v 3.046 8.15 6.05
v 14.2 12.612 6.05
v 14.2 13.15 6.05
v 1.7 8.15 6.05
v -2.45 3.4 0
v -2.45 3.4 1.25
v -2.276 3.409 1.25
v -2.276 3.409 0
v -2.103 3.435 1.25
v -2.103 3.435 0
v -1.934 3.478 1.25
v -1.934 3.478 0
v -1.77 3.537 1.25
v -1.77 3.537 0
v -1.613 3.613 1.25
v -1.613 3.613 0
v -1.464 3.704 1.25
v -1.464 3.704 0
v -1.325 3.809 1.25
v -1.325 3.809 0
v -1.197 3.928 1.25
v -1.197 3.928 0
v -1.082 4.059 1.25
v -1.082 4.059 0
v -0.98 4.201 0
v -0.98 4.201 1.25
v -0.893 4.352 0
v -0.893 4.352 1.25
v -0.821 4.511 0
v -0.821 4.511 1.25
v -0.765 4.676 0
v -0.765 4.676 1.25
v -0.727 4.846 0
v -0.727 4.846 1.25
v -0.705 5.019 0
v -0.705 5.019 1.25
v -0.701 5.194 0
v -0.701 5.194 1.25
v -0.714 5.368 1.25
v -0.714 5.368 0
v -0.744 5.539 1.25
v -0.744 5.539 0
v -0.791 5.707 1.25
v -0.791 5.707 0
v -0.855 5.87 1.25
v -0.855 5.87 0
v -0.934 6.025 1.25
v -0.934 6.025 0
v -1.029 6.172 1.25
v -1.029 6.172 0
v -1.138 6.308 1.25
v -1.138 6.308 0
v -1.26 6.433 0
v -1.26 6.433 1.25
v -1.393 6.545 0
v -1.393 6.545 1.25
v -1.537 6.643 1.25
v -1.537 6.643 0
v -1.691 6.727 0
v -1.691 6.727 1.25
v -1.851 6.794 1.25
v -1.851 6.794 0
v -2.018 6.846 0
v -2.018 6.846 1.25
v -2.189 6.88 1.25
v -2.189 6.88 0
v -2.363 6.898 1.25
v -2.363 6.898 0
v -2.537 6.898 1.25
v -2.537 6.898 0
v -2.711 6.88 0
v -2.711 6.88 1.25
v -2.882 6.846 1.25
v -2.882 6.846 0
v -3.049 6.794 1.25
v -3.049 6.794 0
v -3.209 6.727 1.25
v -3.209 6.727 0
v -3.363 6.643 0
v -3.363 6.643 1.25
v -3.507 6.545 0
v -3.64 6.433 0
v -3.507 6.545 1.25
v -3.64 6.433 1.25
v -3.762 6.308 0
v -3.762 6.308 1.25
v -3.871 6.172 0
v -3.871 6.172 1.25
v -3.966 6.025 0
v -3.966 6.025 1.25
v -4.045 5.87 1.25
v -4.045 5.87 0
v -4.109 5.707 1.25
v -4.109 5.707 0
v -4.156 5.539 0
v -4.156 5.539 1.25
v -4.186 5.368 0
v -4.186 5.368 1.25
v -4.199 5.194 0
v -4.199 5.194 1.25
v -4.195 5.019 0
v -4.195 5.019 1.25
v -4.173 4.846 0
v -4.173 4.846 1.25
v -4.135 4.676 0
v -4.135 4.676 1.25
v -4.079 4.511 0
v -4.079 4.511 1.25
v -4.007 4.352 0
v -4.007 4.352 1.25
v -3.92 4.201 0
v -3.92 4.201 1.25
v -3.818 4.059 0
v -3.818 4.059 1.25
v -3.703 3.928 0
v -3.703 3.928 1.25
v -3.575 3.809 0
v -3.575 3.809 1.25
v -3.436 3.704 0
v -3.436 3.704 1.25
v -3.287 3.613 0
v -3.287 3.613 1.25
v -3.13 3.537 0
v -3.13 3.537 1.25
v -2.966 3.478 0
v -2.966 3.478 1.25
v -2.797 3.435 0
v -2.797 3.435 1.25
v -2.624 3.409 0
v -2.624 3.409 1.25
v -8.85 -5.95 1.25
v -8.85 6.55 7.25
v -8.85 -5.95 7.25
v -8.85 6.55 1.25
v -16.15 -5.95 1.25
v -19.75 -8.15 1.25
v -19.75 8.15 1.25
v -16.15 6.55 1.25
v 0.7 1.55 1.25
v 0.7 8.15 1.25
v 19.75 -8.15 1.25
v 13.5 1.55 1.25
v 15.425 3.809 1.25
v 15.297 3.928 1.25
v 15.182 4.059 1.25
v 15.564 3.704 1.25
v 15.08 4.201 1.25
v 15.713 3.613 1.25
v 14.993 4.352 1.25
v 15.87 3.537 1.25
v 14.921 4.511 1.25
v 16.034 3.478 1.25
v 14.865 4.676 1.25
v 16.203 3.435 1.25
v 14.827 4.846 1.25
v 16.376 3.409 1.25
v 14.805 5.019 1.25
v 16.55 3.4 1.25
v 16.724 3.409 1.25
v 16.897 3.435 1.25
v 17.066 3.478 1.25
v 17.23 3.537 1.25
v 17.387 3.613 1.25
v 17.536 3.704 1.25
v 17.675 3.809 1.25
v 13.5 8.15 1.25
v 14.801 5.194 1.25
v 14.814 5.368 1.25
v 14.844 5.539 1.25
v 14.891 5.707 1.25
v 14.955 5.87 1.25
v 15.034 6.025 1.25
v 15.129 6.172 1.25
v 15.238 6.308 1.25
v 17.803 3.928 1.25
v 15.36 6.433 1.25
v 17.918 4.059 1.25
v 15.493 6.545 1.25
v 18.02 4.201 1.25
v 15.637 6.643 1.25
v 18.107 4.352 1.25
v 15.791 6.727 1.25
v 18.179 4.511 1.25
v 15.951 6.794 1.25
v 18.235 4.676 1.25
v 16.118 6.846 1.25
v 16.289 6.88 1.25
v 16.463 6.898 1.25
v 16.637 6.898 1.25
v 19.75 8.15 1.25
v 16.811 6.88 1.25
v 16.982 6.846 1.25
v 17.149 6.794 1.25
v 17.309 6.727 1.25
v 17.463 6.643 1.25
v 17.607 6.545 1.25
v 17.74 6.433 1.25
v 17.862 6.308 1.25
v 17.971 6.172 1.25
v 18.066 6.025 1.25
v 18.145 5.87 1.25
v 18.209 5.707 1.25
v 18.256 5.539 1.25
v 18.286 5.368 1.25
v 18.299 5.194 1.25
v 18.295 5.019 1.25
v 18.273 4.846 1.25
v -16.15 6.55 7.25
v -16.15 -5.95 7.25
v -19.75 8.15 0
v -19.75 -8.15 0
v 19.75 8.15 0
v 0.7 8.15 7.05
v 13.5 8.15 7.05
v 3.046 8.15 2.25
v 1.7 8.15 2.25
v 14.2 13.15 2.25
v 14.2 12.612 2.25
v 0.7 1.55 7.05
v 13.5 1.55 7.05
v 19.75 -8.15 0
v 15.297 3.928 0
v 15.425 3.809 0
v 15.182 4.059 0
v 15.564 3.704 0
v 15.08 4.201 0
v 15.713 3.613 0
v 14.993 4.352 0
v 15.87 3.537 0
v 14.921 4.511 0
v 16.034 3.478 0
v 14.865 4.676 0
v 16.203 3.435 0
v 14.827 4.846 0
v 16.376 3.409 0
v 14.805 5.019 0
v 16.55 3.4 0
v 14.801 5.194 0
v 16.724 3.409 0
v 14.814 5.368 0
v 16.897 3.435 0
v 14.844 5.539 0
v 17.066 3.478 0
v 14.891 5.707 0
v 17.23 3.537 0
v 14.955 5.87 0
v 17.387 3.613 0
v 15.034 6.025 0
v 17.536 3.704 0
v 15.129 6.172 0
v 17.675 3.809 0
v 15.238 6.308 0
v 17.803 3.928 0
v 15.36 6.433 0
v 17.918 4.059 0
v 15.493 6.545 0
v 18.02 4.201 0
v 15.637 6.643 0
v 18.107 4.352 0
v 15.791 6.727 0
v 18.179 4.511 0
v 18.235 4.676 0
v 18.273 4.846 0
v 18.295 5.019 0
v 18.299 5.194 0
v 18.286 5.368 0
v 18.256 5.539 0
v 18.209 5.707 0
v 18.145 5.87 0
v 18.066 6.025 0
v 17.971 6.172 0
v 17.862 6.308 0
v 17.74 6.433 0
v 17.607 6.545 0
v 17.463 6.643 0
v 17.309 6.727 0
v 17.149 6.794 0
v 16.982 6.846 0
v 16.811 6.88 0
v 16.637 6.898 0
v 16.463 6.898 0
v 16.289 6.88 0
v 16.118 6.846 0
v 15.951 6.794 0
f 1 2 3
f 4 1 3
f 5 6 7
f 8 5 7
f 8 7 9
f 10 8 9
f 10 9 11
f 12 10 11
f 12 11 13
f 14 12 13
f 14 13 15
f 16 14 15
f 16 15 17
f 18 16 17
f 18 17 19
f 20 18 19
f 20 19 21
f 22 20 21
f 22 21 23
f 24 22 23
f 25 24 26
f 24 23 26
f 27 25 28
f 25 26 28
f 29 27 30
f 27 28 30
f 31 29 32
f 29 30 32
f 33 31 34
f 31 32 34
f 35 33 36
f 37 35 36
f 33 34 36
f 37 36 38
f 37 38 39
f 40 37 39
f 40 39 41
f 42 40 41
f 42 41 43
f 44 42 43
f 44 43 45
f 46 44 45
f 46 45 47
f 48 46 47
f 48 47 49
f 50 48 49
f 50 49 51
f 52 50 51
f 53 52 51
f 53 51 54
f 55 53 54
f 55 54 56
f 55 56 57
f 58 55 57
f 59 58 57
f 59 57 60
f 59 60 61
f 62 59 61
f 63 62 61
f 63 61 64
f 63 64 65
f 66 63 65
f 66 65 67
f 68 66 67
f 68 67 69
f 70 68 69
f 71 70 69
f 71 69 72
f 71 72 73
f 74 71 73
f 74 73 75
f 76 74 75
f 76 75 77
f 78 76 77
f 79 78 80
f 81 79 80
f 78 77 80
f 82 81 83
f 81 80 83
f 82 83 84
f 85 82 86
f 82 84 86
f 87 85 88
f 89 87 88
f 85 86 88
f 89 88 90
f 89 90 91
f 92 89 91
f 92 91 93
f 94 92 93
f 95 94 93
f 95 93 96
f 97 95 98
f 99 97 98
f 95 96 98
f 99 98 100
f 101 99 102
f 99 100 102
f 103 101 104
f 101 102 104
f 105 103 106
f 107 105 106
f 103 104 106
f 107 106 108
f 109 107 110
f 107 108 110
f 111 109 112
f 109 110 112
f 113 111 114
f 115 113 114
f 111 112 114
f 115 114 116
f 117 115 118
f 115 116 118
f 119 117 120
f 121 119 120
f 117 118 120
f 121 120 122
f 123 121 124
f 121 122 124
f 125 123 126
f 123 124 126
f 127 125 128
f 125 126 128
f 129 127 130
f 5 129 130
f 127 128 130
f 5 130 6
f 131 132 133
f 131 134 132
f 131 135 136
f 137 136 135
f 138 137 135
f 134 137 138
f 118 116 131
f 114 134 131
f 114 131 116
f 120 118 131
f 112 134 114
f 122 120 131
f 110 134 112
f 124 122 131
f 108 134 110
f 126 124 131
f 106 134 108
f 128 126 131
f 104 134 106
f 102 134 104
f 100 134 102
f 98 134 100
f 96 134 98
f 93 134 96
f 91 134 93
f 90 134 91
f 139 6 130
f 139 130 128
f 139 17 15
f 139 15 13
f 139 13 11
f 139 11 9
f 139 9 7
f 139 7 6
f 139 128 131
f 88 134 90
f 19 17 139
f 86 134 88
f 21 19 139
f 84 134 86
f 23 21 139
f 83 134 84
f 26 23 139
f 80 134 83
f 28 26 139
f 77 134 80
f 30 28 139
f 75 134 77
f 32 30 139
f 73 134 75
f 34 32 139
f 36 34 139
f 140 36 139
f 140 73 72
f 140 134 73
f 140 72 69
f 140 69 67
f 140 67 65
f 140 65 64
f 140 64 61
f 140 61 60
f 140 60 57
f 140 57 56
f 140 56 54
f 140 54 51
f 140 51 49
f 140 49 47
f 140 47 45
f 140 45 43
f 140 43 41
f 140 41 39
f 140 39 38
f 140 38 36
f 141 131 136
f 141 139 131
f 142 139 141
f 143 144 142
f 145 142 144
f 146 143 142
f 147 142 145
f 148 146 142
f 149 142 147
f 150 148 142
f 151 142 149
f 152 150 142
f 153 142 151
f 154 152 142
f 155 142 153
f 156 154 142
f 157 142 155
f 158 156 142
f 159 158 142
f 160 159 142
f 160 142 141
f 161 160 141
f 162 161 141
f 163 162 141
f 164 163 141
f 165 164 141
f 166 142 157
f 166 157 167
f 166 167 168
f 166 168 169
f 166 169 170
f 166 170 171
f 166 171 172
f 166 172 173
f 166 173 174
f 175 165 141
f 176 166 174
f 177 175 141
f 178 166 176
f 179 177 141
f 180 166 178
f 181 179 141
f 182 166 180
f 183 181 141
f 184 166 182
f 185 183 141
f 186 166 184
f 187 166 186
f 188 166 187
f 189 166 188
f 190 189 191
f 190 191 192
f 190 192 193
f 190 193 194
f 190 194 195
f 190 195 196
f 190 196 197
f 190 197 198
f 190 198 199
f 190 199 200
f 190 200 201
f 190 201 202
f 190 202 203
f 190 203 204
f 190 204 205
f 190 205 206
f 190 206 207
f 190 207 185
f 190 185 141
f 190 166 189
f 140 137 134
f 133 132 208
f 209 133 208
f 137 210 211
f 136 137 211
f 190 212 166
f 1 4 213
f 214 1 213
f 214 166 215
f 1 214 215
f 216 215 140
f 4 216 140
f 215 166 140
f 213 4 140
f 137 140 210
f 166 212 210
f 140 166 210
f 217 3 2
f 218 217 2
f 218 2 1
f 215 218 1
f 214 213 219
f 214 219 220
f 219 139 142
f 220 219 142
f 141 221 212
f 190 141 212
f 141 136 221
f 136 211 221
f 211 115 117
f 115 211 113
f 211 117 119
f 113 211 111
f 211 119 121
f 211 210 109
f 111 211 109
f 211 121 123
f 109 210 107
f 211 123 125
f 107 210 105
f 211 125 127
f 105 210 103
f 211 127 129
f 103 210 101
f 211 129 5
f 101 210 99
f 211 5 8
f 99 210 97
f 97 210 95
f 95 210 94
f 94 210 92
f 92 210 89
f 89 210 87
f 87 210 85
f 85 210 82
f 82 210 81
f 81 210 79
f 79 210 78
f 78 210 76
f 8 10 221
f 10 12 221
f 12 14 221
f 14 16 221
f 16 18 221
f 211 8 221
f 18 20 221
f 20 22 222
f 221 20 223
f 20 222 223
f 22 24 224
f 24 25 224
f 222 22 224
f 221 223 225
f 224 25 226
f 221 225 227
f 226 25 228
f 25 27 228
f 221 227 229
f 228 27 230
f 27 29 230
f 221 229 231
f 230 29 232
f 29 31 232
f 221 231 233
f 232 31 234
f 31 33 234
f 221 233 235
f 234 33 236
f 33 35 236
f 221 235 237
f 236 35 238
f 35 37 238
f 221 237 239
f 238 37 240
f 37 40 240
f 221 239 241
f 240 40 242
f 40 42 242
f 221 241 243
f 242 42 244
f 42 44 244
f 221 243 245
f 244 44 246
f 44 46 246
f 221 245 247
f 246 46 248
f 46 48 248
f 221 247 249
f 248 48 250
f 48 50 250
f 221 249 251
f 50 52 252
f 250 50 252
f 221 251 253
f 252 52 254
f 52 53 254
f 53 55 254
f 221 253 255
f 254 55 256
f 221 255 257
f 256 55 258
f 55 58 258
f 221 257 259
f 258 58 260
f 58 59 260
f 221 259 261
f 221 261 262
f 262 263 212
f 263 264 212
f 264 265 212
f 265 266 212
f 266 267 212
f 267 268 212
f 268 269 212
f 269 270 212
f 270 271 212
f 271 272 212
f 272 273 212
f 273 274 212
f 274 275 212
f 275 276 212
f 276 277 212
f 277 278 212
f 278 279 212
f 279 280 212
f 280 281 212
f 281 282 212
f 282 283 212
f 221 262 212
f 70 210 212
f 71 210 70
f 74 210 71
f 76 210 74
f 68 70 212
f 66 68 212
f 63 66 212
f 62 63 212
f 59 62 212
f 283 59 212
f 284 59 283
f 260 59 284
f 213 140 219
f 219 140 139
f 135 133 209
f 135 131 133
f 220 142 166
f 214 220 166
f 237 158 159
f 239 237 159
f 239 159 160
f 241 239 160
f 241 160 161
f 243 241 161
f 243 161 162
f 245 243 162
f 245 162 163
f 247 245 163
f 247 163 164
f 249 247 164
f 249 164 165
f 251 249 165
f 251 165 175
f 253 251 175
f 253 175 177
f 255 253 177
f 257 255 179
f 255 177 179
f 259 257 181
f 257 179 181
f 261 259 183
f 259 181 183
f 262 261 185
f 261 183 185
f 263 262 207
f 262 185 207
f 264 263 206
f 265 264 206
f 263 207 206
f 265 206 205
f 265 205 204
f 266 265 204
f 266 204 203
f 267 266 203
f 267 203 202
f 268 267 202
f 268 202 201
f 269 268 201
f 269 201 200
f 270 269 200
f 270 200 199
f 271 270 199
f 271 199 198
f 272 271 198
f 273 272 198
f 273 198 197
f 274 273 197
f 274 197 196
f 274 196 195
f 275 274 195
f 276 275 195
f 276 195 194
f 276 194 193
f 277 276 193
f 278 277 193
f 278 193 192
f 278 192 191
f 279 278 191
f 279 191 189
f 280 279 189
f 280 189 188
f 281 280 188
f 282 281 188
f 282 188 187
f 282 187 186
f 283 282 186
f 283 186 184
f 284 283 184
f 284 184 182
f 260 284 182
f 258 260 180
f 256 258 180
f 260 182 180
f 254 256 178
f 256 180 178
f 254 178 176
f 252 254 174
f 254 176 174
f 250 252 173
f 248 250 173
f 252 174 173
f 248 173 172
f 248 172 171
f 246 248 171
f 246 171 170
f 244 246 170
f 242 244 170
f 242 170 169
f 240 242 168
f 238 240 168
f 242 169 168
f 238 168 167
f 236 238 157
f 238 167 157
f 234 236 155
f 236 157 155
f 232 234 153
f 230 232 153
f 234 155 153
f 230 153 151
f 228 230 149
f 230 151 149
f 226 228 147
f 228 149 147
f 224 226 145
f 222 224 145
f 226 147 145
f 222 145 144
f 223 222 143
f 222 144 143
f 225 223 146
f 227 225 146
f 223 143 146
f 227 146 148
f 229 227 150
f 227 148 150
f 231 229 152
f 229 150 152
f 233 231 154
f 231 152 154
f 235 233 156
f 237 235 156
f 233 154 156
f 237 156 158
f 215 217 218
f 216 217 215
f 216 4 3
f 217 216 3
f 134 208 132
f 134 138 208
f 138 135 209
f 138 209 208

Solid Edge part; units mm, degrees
sketch "Sketch1" plane through (0, 0, 0) normal (0, 0, 1) x (1, 0, 0)
  line L0 (-19.75, -8.15) -> (19.75, -8.15)
  line L1 (19.75, -8.15) -> (19.75, 8.15)
  line L2 (19.75, 8.15) -> (-19.75, 8.15)
  line L3 (-19.75, 8.15) -> (-19.75, -8.15)
  dimension "D1" = 39.5
  dimension "D2" = 16.3
extrude "Protrusion1" add sketch "Sketch1" along normal blind 1.25
sketch "Sketch2" plane through (0, 0, 1.25) normal (0, 0, 1) x (1, 0, 0)
  line L0 (13.5, 8.15) -> (0.7, 8.15)
  line L1 (0.7, 8.15) -> (0.7, 1.55)
  line L2 (0.7, 1.55) -> (13.5, 1.55)
  line L3 (13.5, 1.55) -> (13.5, 8.15)
  dimension "D1" = 6.25
  dimension "D2" = 12.8
  dimension "D3" = 6.6
extrude "ExtrudedProtrusion_2" add sketch "Sketch2" along normal blind 5.8
sketch "Sketch3" plane through (0, 0, 1.25) normal (0, 0, 1) x (1, 0, 0)
  line L0 (-16.15, 6.55) -> (-8.85, 6.55)
  line L1 (-8.85, 6.55) -> (-8.85, -5.95)
  line L2 (-8.85, -5.95) -> (-16.15, -5.95)
  line L3 (-16.15, -5.95) -> (-16.15, 6.55)
  dimension "D1" = 1.6
  dimension "D2" = 3.6
  dimension "D3" = 7.3
  dimension "D4" = 12.5
extrude "ExtrudedProtrusion_3" add sketch "Sketch3" along normal blind 6
hole "Hole_1" at (16.55, 5.15, 1.25) direction (0, 0, -1) diameter 3.5 end up to next
hole "Hole1" at (-2.45, 5.15, 1.25) direction (0, 0, -1) diameter 3.5 end up to next
sketch "Sketch4" plane through (7.1, 4.85, 7.05) normal (0, 0, 1) x (1, 0, 0)
  line L0 (-5.4, 3.3) -> (7.1, 8.3)
  line L1 (7.1, 8.3) -> (7.1, 7.7615)
  line L2 (7.1, 7.7615) -> (-4.0537, 3.3)
  line L3 (-4.0537, 3.3) -> (-5.4, 3.3)
  dimension "D1" = 5
  dimension "D2" = 1
  dimension "D3" = 0.5
  dimension "D4" = 12.5
extrude "ExtrudedProtrusion_4" add sketch "Sketch4" against normal blind 4.8
sketch "Sketch5" plane through (0.7, 4.85, 4.15) normal (-1, 0, 0) x (0, -1, 0)
  line L0 (-3.3, 2.9) -> (-3.3, 1.9)
  line L1 (-3.3, 1.9) -> (-8.3, 1.9)
  line L2 (-8.3, 1.9) -> (-8.3, 2.9)
  line L3 (-8.3, 2.9) -> (-3.3, 2.9)
  dimension "D1" = 1
extrude "Cutout1" cut sketch "Sketch5" against normal up to next
properties material "Polyethylene, low density"
